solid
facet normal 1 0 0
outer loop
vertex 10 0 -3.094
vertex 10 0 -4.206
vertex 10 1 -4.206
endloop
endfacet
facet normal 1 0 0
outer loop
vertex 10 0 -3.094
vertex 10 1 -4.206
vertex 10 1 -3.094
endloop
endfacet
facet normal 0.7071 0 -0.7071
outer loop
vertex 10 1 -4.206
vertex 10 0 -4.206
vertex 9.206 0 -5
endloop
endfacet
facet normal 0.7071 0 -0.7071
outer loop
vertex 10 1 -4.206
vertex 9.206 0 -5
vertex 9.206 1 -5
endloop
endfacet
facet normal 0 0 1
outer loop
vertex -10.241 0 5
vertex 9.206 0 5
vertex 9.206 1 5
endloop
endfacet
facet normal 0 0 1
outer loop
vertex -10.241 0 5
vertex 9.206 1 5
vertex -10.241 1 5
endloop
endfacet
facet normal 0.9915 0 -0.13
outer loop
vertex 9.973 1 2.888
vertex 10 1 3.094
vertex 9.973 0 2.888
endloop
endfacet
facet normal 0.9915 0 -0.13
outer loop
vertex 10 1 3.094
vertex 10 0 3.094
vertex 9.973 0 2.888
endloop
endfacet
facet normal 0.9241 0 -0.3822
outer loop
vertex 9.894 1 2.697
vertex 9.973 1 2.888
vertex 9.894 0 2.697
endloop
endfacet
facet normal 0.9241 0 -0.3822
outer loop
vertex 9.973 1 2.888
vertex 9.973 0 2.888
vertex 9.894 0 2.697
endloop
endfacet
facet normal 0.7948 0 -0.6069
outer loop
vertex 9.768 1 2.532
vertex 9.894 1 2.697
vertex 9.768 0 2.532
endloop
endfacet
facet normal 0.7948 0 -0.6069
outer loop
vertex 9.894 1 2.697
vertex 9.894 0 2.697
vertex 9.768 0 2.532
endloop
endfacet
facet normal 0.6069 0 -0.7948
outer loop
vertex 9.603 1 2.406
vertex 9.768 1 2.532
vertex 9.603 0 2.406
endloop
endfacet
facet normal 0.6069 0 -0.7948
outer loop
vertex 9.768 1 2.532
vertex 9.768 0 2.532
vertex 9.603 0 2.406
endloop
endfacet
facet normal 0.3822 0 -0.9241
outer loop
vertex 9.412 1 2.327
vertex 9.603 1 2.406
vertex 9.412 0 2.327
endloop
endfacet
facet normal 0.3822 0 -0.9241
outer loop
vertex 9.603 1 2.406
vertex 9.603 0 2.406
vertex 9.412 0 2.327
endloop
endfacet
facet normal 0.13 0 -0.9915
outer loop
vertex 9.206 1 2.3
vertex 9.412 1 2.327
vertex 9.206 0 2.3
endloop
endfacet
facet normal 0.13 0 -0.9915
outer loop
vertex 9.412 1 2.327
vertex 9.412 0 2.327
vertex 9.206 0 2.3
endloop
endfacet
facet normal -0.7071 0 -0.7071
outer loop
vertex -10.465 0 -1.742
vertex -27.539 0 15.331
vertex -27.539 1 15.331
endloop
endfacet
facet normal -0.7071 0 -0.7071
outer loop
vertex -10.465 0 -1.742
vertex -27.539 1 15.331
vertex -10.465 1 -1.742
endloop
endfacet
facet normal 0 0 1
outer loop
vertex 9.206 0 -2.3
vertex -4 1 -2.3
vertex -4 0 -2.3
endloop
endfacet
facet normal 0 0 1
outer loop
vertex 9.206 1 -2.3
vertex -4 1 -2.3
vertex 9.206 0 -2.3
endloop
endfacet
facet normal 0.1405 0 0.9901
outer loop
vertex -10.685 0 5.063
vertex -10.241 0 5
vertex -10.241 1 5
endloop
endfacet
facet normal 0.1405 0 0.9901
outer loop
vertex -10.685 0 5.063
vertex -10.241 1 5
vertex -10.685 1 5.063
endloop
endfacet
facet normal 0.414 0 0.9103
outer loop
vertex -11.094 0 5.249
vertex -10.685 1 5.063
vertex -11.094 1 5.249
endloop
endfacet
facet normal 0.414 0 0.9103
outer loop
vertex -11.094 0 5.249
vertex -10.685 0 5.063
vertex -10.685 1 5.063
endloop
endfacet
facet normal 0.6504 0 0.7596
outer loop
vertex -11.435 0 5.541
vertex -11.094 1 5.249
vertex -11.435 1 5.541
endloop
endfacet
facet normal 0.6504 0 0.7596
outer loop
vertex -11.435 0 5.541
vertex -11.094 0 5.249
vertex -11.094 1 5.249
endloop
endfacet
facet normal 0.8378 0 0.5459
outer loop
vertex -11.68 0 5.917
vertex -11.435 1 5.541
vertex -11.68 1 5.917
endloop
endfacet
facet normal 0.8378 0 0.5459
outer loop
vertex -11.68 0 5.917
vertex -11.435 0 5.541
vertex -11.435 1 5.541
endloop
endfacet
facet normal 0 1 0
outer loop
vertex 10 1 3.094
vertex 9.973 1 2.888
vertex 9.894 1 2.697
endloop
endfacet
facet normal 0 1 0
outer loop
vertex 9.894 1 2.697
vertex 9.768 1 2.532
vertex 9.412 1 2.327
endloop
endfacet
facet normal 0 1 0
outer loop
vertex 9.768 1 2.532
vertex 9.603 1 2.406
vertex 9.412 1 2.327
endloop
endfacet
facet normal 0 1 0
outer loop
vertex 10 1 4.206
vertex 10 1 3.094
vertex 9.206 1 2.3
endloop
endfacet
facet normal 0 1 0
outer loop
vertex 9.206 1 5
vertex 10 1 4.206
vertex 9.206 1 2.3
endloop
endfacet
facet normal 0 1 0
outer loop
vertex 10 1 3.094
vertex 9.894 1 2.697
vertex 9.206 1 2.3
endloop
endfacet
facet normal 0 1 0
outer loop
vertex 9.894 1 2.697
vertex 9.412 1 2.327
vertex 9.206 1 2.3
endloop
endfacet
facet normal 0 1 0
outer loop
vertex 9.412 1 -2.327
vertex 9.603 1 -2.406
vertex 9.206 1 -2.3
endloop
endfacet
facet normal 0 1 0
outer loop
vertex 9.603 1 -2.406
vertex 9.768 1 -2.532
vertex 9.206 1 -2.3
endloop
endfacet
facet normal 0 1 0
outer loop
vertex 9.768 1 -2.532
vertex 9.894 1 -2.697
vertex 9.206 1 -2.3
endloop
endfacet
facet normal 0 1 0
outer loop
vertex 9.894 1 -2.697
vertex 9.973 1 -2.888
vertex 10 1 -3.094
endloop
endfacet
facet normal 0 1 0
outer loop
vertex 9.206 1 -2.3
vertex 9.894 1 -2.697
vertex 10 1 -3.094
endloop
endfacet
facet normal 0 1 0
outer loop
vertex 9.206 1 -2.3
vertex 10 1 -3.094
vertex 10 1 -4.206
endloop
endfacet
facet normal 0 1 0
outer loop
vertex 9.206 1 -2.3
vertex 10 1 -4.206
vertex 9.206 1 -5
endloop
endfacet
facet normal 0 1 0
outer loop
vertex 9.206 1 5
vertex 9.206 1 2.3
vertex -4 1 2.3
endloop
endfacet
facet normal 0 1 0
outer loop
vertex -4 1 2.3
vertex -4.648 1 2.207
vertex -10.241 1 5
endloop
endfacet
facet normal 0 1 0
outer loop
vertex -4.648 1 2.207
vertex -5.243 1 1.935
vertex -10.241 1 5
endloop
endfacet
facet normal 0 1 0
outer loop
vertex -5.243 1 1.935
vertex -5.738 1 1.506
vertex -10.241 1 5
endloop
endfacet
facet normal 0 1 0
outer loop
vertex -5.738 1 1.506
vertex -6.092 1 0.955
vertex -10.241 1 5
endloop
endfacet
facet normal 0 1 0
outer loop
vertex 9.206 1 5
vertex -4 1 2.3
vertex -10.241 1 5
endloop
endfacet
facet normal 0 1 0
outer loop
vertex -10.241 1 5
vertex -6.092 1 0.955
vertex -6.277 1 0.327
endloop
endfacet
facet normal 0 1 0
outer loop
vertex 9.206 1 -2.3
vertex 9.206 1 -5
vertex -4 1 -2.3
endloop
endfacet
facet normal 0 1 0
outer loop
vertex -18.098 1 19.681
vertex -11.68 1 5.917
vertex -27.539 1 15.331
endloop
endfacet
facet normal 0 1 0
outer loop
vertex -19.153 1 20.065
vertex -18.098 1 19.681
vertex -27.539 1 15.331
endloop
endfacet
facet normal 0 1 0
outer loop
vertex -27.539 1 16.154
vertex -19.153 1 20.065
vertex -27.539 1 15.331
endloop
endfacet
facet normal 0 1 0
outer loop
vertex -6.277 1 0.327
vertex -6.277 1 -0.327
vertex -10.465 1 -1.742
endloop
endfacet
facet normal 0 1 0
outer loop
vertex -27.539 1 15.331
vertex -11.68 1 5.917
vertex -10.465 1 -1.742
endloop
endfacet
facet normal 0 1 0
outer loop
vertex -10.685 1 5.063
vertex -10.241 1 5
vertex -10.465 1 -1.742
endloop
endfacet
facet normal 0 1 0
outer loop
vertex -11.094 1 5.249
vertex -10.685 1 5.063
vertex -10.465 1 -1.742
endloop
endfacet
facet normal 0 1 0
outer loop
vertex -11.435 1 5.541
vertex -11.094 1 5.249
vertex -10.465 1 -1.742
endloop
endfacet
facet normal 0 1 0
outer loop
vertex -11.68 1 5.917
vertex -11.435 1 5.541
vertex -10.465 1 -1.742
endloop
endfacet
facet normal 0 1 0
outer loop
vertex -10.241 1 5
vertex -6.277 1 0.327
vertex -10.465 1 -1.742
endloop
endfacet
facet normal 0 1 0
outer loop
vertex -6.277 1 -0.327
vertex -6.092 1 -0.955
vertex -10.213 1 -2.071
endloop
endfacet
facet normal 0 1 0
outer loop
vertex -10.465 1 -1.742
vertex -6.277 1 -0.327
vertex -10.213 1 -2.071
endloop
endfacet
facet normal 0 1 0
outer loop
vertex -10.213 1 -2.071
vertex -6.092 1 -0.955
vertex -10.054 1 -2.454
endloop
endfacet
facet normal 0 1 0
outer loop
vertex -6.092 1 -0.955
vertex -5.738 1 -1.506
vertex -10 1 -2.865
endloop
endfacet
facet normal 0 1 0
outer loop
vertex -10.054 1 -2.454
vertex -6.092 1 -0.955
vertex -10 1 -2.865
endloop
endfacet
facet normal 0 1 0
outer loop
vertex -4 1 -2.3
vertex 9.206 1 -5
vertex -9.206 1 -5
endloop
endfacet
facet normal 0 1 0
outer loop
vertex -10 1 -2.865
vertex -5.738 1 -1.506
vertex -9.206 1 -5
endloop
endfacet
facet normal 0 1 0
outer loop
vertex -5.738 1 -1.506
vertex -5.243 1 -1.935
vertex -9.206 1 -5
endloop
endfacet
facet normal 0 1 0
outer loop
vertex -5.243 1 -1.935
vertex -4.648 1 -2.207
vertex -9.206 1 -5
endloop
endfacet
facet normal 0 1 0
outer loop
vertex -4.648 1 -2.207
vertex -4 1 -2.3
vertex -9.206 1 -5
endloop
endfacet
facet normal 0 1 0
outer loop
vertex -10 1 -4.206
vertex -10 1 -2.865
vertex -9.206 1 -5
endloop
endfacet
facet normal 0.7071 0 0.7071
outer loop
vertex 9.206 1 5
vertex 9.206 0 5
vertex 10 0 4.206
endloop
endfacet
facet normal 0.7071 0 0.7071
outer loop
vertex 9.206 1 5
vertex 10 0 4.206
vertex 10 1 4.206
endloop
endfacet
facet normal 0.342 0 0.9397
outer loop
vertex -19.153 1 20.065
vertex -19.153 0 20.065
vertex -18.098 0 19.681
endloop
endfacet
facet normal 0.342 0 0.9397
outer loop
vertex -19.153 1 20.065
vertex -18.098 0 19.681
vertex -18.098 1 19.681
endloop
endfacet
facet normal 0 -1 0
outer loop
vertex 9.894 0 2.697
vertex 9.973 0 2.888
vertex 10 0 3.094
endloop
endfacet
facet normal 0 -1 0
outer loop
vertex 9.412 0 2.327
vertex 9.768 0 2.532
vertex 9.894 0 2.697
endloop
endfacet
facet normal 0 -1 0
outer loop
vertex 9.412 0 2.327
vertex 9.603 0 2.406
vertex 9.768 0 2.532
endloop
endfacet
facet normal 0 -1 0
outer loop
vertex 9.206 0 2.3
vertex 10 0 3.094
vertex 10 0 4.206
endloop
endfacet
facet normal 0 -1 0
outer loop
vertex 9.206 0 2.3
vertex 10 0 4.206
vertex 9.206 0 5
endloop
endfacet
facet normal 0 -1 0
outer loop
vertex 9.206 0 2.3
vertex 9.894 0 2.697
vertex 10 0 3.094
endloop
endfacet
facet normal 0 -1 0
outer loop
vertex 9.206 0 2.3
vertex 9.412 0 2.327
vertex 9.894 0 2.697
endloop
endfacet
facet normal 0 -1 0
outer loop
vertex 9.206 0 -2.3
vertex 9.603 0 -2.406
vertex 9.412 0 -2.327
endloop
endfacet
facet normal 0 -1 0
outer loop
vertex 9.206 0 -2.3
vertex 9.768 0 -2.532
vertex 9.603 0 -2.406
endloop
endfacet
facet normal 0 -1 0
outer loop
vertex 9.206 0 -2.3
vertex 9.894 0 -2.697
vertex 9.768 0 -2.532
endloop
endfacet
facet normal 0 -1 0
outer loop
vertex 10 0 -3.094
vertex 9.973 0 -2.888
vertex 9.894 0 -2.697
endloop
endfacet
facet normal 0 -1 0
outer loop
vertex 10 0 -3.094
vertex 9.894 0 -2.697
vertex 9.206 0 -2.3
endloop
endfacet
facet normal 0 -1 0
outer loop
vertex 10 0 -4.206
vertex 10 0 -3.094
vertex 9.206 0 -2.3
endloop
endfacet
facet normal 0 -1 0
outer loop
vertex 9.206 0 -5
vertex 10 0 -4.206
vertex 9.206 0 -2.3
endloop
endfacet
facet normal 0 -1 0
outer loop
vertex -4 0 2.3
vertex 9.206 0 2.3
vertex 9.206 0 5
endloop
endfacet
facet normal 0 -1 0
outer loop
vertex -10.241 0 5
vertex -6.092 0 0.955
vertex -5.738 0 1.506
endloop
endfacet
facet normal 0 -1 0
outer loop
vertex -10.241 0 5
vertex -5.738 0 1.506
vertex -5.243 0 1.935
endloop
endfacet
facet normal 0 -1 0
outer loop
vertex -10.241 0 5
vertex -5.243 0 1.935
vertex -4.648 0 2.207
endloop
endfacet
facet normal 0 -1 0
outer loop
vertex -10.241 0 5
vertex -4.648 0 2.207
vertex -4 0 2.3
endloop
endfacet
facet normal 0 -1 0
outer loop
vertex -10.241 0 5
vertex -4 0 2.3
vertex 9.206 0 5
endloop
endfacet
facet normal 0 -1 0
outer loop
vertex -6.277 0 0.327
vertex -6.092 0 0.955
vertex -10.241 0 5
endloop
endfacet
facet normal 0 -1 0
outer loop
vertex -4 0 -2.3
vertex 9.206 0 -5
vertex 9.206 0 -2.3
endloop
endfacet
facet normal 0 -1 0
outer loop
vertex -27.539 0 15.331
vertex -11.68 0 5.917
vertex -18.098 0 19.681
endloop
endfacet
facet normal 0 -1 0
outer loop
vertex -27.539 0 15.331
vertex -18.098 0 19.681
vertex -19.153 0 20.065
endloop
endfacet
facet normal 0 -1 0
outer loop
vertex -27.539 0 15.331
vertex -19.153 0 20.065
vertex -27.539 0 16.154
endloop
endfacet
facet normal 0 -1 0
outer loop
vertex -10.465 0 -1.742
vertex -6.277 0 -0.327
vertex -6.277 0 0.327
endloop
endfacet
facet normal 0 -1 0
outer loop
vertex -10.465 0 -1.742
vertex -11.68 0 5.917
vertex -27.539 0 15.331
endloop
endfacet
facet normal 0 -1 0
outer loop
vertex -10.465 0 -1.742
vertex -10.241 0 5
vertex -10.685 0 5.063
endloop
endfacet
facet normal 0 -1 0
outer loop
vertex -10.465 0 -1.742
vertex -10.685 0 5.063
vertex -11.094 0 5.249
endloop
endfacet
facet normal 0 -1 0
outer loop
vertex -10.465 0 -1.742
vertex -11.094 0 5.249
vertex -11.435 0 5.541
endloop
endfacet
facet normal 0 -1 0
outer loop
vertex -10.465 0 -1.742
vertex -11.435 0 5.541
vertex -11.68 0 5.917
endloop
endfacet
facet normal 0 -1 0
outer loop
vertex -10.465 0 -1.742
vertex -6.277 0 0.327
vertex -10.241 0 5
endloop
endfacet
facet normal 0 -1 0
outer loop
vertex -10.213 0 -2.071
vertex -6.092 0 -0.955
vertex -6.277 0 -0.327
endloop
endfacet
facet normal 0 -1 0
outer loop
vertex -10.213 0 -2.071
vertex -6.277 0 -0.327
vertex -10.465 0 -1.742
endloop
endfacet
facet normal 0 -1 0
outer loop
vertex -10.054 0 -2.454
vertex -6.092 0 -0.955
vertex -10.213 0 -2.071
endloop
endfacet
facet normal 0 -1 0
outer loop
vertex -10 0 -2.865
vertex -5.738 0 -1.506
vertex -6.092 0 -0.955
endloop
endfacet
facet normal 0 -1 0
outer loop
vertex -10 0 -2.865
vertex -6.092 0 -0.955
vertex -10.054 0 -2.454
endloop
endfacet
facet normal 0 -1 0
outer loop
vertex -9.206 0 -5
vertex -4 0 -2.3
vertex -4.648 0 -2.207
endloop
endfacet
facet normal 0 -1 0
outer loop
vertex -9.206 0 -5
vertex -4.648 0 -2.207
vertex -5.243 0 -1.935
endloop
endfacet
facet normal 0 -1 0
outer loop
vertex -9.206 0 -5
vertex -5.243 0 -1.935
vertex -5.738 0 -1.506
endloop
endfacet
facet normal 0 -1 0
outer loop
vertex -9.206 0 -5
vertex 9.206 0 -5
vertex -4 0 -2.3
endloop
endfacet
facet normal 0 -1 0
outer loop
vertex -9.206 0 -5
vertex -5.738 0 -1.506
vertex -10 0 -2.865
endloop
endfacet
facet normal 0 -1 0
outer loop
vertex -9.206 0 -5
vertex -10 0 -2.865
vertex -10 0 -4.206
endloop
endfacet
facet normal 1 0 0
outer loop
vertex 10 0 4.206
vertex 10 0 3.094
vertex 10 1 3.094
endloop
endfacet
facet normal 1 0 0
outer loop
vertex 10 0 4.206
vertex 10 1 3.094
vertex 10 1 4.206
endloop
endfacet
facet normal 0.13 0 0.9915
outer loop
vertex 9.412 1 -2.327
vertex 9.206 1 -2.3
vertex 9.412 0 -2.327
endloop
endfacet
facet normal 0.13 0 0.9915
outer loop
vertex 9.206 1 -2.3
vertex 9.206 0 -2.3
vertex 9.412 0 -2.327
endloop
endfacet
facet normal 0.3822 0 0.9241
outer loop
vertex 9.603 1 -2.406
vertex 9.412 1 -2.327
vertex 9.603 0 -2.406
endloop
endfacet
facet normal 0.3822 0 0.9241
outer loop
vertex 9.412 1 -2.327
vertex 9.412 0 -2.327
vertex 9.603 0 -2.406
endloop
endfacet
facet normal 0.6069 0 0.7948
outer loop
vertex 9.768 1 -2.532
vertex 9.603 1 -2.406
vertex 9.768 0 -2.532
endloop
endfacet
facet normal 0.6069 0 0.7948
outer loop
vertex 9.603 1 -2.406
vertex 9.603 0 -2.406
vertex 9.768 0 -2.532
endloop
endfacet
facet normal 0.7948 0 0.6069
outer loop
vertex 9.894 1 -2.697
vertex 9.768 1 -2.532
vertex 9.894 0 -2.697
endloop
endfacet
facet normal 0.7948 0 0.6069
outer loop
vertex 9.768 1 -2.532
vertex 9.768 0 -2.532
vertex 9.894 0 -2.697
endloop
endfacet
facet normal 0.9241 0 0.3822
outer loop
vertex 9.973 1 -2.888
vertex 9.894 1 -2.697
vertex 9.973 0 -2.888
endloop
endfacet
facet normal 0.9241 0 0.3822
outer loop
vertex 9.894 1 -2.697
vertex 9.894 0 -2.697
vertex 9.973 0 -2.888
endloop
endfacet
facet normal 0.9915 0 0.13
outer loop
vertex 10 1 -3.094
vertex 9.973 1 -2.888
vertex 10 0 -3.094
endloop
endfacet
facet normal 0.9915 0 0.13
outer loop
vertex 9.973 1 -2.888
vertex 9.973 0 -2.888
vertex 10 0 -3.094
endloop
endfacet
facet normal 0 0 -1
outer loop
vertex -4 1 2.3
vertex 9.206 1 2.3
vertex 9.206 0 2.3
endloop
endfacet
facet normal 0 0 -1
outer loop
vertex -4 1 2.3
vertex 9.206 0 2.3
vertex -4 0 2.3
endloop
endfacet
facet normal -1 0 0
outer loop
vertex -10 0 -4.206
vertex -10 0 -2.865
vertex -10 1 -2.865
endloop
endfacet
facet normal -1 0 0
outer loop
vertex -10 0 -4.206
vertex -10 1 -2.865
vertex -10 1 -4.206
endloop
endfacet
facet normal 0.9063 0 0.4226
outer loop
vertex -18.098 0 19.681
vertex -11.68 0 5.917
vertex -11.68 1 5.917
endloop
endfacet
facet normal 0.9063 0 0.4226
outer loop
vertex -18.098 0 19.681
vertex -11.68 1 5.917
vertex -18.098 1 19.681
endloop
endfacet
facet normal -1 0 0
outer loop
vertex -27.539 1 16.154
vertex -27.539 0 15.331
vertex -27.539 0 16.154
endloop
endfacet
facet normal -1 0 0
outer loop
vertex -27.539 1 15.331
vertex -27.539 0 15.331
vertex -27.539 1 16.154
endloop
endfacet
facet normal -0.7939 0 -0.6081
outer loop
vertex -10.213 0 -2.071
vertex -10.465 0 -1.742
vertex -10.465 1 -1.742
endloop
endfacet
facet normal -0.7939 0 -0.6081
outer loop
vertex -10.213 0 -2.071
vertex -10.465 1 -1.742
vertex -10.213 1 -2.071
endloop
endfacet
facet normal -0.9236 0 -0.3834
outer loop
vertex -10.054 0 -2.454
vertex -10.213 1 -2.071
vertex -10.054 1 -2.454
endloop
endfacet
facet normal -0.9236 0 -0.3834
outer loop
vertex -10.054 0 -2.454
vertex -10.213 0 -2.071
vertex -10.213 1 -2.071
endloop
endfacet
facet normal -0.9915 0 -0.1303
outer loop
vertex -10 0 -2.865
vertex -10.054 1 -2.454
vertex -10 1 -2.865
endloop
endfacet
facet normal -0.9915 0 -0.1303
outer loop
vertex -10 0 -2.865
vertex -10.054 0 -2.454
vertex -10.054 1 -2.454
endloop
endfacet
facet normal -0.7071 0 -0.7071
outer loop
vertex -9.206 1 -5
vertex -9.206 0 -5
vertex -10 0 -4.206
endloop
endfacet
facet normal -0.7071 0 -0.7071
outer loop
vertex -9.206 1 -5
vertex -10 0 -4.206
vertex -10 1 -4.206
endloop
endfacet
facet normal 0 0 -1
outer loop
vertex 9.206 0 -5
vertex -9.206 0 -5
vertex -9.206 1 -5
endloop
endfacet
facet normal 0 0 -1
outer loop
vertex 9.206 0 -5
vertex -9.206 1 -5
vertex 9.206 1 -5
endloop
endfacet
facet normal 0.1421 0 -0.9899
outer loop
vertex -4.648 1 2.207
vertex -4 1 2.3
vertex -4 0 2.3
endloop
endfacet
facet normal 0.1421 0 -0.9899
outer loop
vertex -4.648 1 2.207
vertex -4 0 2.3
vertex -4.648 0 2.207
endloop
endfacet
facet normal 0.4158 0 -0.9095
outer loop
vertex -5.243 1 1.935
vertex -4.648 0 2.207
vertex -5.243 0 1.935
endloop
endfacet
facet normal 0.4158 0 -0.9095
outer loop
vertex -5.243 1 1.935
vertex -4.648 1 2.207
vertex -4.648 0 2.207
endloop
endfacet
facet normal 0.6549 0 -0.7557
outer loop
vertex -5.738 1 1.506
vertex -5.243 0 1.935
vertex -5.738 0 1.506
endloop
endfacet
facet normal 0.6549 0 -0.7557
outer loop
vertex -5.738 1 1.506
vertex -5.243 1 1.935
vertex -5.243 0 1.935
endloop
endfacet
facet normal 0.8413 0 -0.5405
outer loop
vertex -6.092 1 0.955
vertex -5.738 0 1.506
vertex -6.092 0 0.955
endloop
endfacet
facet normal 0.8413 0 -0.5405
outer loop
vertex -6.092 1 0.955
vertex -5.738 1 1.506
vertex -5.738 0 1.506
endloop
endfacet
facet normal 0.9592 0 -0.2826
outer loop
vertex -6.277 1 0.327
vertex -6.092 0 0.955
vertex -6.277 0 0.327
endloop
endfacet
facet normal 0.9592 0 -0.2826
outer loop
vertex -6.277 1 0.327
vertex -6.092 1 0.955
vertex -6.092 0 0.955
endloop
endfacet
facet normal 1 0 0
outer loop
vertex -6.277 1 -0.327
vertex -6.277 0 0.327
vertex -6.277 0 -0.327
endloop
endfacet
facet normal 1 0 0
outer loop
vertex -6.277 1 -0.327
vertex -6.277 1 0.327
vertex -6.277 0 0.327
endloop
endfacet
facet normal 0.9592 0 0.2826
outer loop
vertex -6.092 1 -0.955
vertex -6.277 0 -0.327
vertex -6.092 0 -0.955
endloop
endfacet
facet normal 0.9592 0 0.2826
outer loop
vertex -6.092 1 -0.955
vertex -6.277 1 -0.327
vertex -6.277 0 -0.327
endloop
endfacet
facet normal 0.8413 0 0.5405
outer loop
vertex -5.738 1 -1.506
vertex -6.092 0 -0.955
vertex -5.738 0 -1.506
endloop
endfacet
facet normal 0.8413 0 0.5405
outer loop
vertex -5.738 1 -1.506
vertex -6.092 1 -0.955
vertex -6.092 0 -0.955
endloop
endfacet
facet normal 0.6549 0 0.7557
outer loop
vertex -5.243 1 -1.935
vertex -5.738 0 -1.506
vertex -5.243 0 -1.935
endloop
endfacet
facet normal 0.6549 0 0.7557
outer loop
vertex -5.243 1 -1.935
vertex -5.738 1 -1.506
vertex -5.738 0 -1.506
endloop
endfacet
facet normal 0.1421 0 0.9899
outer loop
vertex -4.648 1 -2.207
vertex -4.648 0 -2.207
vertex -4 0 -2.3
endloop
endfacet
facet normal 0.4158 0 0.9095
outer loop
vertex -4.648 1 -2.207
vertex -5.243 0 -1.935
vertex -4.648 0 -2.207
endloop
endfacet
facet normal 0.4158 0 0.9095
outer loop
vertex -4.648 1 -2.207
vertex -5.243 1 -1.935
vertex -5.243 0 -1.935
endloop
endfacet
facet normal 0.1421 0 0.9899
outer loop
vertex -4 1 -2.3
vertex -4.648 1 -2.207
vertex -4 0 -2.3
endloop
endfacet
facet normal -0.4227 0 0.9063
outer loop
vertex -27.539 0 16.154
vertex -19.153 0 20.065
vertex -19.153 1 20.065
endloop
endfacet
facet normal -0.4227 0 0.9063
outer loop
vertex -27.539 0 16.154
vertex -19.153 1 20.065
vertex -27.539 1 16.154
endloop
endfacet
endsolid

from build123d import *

# Parameters (mm, degrees)
BOSS_EXTRUDE1_DEPTH   = 1
CUT_EXTRUDE1_DEPTH    = 2
FILLET1_R             = 0.79375
CHAMFER1_SIZE         = 0.79375
CHAMFER1_EDGE_2_SIZE  = 0.79375
CHAMFER1_EDGE_3_SIZE  = 0.619288519
CHAMFER1_EDGE_3_SIZE2 = 0.79375
CHAMFER1_EDGE_4_SIZE  = 0.79375
CHAMFER1_EDGE_5_SIZE  = 0.79375


with BuildPart() as part:
    # Sketch1 → Boss-Extrude1 (new body)
    with BuildSketch(Plane(origin=(0, 0, 0), x_dir=(1, 0, 0), z_dir=(0, 1, 0))):
        with BuildLine():
            Line((-11.680023612, -5.916593509), (-18.433746975, -20.4))
            Line((-18.433746975, -20.4), (-28.1, -15.892552189))
            Line((-28.1, -15.892552189), (-10.464967985, 1.742479827))
            ThreePointArc((-10.464967985, 1.742479827), (-10.120841242, 2.257501893), (-10, 2.865011842))
            Line((-10, 2.865011842), (-10, 5))
            Line((-10, 5), (10, 5))
            Line((10, 5), (10, -5))
            Line((10, -5), (-10.24126, -5))
            ThreePointArc((-10.24126, -5), (-11.094223128, -5.24861608), (-11.680023612, -5.916593509))
        make_face()
    extrude(amount=BOSS_EXTRUDE1_DEPTH)

    # Sketch2 → Cut-Extrude1 (cut, through all)
    with BuildSketch(Plane(origin=(0, 1, 0), x_dir=(1, 0, 0), z_dir=(0, 1, 0))):
        with BuildLine():
            Line((-3.99999994, 2.3), (10, 2.3))
            Line((10, 2.3), (10, -2.3))
            Line((10, -2.3), (-3.99999994, -2.3))
            ThreePointArc((-3.99999994, -2.3), (-6.29999994, 0), (-3.99999994, 2.3))
        make_face()
    extrude(amount=-CUT_EXTRUDE1_DEPTH, mode=Mode.SUBTRACT)

    # Fillet1
    fillet1_edges = [part.edges().sort_by_distance(p)[0] for p in [
        (10, 0.5, -2.3),
        (10, 0.5, 2.3),
    ]]
    fillet(fillet1_edges, radius=FILLET1_R)

    # Chamfer1
    chamfer1_edges = [part.edges().sort_by_distance(p)[0] for p in [
        (10, 0.5, 5),
    ]]
    chamfer(chamfer1_edges, length=CHAMFER1_SIZE)

    # Chamfer1 edge 2
    chamfer1_edge_2_edges = [part.edges().sort_by_distance(p)[0] for p in [
        (-18.433746975, 0.5, 20.4),
    ]]
    chamfer(chamfer1_edge_2_edges, length=CHAMFER1_EDGE_2_SIZE)

    # Chamfer1 edge 3
    chamfer1_edge_3_edges = [part.edges().sort_by_distance(p)[0] for p in [
        (-28.1, 0.5, 15.892552189),
    ]]
    chamfer1_edge_3_side = [part.faces().sort_by_distance(p)[0] for p in [
        (-23.266873487, 0.5, 18.146276094),
    ]]
    chamfer(chamfer1_edge_3_edges, length=CHAMFER1_EDGE_3_SIZE, length2=CHAMFER1_EDGE_3_SIZE2, reference=chamfer1_edge_3_side[0])

    # Chamfer1 edge 4
    chamfer1_edge_4_edges = [part.edges().sort_by_distance(p)[0] for p in [
        (-10, 0.5, -5),
    ]]
    chamfer(chamfer1_edge_4_edges, length=CHAMFER1_EDGE_4_SIZE)

    # Chamfer1 edge 5
    chamfer1_edge_5_edges = [part.edges().sort_by_distance(p)[0] for p in [
        (10, 0.5, -5),
    ]]
    chamfer(chamfer1_edge_5_edges, length=CHAMFER1_EDGE_5_SIZE)


solid = part.part
